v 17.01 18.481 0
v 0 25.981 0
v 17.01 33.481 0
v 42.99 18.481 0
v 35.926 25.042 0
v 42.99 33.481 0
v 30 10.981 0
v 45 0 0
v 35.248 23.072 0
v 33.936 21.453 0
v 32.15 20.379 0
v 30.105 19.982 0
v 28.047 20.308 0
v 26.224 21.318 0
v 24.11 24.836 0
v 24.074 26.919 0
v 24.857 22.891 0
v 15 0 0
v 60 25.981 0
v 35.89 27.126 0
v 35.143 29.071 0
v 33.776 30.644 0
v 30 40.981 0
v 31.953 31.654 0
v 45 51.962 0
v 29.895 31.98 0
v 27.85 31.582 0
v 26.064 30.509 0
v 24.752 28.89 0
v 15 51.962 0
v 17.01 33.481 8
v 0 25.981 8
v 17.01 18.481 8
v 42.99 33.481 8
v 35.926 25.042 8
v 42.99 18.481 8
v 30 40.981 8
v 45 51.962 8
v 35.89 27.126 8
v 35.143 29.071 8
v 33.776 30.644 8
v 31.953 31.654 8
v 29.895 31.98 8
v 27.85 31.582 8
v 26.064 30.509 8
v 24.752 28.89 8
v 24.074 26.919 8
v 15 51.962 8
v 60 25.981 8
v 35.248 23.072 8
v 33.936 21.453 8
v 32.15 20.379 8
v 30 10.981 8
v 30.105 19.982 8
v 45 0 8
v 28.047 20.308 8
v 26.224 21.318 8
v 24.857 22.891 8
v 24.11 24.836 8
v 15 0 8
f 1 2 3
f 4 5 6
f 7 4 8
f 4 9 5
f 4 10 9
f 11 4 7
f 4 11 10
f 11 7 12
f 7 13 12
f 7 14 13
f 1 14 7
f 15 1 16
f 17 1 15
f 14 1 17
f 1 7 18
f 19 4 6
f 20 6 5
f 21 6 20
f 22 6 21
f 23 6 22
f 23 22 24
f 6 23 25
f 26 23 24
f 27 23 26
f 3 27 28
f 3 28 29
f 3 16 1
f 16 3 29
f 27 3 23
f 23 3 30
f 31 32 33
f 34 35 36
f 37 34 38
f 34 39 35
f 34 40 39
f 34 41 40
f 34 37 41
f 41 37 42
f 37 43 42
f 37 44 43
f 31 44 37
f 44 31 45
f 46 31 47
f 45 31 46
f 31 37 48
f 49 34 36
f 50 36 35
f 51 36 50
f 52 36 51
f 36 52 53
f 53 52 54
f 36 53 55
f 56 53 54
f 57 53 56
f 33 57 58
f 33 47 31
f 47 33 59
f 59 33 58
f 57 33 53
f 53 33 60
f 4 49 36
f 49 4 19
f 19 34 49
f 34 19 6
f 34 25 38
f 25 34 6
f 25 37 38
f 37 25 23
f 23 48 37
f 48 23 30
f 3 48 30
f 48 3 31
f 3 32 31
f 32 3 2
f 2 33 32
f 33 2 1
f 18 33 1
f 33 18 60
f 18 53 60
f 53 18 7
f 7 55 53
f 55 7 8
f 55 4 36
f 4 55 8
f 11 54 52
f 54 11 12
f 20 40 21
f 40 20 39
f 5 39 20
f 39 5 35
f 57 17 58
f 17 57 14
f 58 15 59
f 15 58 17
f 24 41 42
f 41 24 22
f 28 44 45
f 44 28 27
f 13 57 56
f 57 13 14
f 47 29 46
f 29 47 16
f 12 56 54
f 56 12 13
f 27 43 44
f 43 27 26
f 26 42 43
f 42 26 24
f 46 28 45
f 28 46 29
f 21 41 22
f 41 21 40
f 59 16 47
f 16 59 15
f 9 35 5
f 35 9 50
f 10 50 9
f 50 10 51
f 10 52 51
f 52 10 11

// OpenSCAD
$fn = 32;

// ----------------------------------------------------------------------
// Star wheel: 6-point star, R30
// ----------------------------------------------------------------------

// --- parameters (mm) ---
n_points = 6;             // number of points / teeth
r_out = 30;               // tip radius
r_in = 15;                // root radius
bore_r = 6;               // centre bore radius
plate_t = 8;              // plate thickness, Z (extrusion height)
bore_d = 12;              // centre bore diameter

profile = [[0, 25.981], [17.01, 18.481], [15, 0], [30, 10.981], [45, 0], [42.99, 18.481], [60, 25.981], [42.99, 33.481], [45, 51.962], [30, 40.981], [15, 51.962], [17.01, 33.481]];  // primary outline, 12 points, counter clockwise
void_1 = [[35.89, 27.126], [35.143, 29.071], [33.776, 30.644], [31.953, 31.654], [29.895, 31.98], [27.85, 31.582], [26.064, 30.509], [24.752, 28.89], [24.074, 26.919], [24.11, 24.836], [24.857, 22.891], [26.224, 21.318], [28.047, 20.308], [30.105, 19.982], [32.15, 20.379], [33.936, 21.453], [35.248, 23.072], [35.926, 25.042]];  // centre bore, 18 points

// --- the one profile operation ---
difference() {
  linear_extrude(height = plate_t) polygon(points = profile);
  translate([0, 0, -1])
    linear_extrude(height = plate_t + 2) polygon(points = void_1);
}
